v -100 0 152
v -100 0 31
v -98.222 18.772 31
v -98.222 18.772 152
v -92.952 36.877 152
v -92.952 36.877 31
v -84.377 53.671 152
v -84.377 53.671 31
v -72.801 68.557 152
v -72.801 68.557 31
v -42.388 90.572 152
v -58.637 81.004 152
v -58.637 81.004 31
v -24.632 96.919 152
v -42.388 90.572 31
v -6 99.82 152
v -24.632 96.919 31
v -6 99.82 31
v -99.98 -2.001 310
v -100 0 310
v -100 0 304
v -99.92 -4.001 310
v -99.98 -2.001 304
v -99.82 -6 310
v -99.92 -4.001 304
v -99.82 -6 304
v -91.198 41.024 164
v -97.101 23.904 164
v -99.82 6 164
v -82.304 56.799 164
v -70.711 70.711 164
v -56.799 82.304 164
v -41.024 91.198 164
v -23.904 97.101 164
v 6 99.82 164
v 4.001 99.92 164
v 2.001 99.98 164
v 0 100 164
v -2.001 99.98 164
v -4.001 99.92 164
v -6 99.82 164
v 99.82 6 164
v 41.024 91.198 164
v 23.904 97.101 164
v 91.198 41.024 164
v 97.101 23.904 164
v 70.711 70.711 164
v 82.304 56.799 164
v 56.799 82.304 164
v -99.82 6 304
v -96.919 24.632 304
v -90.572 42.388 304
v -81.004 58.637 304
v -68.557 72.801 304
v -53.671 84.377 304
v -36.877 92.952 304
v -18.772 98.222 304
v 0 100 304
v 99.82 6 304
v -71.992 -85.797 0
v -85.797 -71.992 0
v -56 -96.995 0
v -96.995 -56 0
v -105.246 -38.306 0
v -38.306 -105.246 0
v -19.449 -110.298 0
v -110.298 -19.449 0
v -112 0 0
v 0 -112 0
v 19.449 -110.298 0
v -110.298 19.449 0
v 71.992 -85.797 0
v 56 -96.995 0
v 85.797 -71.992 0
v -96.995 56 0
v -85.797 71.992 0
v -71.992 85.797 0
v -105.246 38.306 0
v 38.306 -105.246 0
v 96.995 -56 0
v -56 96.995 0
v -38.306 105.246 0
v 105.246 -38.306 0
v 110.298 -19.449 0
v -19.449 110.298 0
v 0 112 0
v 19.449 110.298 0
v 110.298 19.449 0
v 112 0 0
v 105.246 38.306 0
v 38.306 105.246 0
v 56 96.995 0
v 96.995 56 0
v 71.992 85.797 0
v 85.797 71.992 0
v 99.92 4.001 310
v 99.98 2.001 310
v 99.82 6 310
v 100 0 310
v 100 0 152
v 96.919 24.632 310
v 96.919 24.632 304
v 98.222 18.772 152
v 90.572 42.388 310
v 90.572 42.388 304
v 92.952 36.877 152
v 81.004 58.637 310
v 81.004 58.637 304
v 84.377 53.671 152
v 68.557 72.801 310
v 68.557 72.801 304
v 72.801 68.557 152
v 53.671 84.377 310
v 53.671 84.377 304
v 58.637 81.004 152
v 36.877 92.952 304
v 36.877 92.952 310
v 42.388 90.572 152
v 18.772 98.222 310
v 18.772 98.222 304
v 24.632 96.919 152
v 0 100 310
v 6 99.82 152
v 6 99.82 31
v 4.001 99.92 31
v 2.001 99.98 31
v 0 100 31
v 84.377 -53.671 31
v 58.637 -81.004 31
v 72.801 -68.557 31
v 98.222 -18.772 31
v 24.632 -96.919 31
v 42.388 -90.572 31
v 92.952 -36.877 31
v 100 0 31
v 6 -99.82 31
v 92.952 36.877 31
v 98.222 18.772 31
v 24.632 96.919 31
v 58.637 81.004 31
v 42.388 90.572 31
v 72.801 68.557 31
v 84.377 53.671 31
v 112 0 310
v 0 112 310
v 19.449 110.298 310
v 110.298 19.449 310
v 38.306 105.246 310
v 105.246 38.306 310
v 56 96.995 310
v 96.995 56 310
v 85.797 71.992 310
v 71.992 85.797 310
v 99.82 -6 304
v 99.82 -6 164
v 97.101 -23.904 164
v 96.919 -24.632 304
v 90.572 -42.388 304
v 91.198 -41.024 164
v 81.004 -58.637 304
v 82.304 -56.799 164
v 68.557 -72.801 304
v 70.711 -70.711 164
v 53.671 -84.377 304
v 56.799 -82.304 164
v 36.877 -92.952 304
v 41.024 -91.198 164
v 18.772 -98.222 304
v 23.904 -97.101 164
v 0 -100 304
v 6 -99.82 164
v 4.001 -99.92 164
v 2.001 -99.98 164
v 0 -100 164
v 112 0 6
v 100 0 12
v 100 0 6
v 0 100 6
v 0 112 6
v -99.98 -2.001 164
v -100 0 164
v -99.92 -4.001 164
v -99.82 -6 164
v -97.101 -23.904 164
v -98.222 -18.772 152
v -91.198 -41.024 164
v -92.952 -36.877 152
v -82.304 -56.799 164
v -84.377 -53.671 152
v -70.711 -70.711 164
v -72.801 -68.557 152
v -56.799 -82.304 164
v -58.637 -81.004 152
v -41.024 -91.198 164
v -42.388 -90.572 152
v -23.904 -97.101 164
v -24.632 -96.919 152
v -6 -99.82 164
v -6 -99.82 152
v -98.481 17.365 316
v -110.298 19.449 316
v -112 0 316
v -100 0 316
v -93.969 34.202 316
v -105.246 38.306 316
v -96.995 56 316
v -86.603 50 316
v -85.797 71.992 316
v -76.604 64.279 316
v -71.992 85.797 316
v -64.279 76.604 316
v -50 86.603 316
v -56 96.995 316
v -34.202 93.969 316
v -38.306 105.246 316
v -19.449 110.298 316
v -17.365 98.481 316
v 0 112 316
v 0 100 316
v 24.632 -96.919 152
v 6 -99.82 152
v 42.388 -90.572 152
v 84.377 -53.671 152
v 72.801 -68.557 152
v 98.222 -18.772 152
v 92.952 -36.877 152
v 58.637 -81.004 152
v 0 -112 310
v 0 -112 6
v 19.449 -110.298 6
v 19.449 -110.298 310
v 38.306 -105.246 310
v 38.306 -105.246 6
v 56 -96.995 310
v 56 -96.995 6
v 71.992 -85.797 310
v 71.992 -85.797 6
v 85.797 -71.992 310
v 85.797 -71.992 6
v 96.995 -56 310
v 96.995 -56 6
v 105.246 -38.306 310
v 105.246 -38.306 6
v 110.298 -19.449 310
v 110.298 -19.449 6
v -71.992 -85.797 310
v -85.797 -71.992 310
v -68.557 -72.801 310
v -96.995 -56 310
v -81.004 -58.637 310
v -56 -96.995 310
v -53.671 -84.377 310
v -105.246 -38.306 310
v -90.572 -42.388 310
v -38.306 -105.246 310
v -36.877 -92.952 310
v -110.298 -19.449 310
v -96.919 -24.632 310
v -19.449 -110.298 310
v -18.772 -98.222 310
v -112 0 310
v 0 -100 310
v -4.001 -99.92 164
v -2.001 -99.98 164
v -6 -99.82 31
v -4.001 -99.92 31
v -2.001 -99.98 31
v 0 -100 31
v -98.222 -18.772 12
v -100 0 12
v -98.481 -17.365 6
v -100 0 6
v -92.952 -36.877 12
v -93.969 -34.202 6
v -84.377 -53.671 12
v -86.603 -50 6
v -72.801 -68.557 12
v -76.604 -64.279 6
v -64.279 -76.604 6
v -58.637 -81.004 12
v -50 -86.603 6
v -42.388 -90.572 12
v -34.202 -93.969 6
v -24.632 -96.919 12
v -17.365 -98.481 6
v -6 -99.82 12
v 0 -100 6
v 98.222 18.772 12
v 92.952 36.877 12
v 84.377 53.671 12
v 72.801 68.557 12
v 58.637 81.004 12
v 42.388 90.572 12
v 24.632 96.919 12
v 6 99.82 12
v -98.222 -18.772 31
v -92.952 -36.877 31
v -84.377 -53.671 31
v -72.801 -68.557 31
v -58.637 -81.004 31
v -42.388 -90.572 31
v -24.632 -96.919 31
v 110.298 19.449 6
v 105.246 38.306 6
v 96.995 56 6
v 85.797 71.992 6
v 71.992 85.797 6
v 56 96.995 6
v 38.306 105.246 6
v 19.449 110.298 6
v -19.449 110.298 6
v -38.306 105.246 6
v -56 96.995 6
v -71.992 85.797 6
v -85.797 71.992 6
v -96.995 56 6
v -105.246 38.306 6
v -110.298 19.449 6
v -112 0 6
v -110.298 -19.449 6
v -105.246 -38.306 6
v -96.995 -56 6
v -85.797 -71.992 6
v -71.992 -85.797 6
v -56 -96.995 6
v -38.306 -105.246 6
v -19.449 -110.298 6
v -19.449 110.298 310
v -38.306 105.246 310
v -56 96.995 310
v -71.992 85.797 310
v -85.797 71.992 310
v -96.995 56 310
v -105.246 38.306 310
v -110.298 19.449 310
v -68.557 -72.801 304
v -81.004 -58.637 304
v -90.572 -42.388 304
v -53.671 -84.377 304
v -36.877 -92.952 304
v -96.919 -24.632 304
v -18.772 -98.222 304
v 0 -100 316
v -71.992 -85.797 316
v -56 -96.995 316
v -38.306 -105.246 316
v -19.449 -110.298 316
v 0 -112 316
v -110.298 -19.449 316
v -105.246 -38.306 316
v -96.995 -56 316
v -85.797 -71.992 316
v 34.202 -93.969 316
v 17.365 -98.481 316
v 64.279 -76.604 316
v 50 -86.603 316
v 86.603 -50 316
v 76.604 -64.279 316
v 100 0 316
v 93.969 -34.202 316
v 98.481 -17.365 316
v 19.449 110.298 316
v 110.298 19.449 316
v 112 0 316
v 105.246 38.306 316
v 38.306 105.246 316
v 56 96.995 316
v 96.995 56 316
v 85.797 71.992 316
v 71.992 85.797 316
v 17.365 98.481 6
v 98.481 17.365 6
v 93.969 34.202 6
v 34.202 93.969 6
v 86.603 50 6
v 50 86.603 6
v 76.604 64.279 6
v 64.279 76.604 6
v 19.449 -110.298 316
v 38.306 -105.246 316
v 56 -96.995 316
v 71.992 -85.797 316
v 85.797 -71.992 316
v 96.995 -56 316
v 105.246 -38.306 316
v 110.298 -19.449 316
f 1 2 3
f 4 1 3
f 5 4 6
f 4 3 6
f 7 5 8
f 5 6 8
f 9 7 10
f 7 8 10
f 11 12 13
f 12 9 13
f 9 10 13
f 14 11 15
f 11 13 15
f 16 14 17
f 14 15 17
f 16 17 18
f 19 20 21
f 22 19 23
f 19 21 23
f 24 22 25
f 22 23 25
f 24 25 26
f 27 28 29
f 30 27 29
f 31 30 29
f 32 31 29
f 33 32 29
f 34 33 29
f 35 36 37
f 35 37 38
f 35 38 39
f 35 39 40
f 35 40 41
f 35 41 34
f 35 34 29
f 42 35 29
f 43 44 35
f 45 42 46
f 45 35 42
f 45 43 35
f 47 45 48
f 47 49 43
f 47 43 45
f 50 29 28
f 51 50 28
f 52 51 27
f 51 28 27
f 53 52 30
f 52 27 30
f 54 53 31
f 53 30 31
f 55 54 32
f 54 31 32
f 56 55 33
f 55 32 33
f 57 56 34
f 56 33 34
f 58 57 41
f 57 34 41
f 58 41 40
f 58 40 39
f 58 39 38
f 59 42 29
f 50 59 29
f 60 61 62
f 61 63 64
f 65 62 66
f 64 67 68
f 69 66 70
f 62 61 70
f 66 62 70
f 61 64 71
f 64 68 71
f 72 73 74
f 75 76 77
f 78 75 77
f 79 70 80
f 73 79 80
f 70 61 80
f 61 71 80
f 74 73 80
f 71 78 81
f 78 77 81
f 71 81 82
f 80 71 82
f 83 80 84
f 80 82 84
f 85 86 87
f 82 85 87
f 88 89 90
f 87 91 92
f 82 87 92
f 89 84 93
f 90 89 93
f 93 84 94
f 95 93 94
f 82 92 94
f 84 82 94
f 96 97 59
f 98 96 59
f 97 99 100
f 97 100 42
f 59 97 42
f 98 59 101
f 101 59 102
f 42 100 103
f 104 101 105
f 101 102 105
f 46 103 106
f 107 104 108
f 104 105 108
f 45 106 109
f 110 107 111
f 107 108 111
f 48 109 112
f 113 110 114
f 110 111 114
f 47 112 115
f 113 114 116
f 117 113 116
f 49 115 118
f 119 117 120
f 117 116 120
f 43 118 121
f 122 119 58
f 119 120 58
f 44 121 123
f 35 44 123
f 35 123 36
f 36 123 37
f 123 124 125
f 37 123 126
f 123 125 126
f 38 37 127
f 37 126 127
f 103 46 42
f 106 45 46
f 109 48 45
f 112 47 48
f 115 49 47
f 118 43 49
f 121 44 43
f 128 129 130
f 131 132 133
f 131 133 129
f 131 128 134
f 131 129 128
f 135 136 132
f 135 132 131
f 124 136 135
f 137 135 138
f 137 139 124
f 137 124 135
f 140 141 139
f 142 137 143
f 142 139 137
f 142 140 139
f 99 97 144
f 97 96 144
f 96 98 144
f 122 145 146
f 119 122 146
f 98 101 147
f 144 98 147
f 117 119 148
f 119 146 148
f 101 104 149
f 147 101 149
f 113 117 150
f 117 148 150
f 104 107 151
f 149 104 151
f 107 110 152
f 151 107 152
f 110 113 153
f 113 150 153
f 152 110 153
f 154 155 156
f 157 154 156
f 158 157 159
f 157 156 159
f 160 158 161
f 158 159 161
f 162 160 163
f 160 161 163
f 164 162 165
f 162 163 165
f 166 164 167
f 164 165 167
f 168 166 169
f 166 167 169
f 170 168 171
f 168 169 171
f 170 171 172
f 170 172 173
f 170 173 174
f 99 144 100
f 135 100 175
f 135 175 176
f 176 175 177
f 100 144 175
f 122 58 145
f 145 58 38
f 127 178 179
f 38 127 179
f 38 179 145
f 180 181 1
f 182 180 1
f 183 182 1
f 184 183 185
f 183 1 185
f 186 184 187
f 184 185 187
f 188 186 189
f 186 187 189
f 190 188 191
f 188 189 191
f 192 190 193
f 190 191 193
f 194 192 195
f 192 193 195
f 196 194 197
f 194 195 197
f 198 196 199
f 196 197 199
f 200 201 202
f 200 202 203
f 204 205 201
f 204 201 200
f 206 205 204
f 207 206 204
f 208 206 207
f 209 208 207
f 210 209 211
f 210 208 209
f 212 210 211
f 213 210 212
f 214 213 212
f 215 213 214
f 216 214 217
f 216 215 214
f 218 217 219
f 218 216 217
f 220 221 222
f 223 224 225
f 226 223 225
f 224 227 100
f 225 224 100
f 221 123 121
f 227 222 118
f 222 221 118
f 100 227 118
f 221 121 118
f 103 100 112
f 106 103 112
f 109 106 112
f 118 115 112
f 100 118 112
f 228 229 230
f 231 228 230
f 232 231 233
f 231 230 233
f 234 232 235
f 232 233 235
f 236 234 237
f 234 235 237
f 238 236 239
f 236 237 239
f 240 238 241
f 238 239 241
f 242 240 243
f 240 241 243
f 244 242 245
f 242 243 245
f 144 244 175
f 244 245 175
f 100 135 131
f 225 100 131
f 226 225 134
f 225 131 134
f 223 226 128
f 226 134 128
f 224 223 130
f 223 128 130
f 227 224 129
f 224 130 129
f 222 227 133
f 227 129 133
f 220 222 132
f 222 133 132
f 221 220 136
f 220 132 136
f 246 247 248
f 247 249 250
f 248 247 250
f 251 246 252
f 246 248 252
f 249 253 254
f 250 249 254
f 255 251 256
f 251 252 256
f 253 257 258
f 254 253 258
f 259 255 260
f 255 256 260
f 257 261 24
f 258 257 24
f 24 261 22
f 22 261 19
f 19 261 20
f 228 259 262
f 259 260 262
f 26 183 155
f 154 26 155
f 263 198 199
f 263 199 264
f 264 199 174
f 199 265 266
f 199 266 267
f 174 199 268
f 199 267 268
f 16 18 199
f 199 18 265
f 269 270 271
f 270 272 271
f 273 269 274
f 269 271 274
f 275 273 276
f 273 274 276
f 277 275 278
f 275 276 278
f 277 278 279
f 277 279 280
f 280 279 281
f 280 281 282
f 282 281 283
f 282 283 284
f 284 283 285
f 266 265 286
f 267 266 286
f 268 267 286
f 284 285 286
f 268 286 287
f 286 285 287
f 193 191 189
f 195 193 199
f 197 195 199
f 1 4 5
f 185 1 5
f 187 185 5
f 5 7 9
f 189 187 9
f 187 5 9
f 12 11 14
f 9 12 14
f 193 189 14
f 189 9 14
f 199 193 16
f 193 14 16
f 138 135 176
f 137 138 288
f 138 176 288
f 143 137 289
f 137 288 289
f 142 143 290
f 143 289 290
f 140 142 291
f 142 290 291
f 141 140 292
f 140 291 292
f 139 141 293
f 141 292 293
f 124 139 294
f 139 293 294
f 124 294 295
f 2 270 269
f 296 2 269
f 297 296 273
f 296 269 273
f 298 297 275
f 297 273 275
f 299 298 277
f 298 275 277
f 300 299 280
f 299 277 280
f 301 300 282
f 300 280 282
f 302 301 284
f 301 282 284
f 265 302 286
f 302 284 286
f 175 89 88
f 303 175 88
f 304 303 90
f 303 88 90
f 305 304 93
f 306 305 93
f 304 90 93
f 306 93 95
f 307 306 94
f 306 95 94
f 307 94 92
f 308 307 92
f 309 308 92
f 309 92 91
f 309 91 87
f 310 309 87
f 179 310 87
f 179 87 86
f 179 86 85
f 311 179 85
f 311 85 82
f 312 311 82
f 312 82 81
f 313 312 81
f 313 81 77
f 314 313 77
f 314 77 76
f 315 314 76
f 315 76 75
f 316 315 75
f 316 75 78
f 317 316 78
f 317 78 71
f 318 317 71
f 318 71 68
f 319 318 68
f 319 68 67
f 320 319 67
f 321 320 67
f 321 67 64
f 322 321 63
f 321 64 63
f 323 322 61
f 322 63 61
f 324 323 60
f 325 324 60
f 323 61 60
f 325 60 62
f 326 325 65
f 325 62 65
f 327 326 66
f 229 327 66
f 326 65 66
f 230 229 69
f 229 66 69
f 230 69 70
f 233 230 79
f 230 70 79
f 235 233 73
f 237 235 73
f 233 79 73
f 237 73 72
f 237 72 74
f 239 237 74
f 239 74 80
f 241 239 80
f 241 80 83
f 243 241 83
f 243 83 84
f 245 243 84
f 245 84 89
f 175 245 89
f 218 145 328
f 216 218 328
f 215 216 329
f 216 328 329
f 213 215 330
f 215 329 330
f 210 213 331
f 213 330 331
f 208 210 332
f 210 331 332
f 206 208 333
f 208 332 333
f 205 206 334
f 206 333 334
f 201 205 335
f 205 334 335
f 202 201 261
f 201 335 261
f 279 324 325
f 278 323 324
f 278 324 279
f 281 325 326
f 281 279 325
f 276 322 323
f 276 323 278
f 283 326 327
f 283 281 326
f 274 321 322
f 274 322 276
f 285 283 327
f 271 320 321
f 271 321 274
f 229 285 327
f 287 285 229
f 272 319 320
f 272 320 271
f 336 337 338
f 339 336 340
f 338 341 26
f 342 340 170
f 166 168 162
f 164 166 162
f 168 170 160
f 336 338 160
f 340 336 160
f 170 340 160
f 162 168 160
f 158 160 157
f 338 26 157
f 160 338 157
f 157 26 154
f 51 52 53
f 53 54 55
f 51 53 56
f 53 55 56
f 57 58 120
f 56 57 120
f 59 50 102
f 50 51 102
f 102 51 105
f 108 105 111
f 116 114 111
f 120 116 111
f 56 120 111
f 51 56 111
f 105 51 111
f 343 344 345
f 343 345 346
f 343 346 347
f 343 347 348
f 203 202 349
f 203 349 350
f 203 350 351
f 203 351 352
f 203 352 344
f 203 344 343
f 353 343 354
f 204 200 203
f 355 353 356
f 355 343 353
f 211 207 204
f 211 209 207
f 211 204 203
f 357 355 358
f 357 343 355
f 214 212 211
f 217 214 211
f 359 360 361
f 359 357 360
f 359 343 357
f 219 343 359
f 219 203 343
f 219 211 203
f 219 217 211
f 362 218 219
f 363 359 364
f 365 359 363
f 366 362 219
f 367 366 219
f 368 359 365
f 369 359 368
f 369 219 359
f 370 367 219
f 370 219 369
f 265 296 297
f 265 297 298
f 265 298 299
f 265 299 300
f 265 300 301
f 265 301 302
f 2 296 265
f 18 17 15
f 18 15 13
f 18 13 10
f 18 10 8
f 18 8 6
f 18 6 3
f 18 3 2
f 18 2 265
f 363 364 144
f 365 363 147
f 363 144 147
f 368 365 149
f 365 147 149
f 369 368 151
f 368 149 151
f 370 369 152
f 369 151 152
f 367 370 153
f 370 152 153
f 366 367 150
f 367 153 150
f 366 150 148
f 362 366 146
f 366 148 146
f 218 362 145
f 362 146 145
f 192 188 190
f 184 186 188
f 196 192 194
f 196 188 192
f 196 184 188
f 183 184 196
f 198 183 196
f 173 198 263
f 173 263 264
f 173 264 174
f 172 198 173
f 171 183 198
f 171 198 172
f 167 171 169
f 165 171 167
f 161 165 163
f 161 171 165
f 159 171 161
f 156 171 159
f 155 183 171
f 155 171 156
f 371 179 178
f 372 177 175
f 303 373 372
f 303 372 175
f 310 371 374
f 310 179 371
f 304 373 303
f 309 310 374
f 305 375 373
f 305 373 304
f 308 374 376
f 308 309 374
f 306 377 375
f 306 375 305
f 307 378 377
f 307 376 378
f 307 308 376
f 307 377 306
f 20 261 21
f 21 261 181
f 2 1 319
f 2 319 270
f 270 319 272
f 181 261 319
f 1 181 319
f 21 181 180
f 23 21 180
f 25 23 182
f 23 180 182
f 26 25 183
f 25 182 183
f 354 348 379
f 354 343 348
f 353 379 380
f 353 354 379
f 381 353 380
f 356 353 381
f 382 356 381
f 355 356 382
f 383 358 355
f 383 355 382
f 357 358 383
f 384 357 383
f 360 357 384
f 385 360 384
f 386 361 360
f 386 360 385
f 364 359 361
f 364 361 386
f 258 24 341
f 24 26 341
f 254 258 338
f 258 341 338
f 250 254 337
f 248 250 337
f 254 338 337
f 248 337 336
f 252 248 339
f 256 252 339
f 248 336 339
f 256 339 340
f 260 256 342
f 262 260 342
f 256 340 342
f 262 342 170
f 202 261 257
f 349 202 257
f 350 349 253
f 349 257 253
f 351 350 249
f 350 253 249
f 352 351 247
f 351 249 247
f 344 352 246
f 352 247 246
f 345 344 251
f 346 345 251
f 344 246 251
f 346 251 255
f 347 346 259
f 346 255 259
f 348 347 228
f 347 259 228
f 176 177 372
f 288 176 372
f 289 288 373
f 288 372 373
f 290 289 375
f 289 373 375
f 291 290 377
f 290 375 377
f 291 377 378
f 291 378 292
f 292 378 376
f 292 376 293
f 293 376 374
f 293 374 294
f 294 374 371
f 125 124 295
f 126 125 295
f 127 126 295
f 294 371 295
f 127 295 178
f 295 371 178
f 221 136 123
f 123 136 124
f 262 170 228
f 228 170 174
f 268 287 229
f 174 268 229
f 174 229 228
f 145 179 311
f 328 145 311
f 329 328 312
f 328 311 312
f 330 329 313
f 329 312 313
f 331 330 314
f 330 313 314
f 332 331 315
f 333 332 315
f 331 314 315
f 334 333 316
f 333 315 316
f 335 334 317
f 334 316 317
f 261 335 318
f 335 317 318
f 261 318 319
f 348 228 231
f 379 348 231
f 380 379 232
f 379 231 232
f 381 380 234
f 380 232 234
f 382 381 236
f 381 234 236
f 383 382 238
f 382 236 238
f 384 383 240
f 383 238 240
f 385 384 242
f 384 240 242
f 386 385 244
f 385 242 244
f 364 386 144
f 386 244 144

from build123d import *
from build123d import SkipClean  # not in build123d's __all__

# Parameters (mm, degrees)
F0_R      = 112
F1_DEPTH  = 6
F3_DEPTH  = 6
F5_DEPTH  = 140
F7_DEPTH  = 12
F9_DEPTH  = 140
F11_DEPTH = 6
F12_R     = 112
F12_R_2   = 100
F13_DEPTH = 6
F14_DEPTH = 25
F16_DEPTH = 310


with BuildPart() as f1:
    # F0 (on Top) → F1 (new body)
    with BuildSketch(Plane.XY):
        Circle(F0_R)
    extrude(amount=F1_DEPTH)

    # F2 (on face) → F3 (join)
    with BuildSketch(Plane.XY.offset(6)):
        with BuildLine():
            ThreePointArc((-100, 0), (0, -100), (100, 0))
            ThreePointArc((100, 0), (70.7106781187, 70.7106781187), (0, 100))
            ThreePointArc((0, 100), (-70.7106781187, 70.7106781187), (-100, 0))
        make_face()
    extrude(amount=F3_DEPTH)

    # F4 (on face) → F5 (join)
    with BuildSketch(Plane.XY.offset(12)):
        with BuildLine():
            ThreePointArc((6, 99.8198377077), (3.0013521308, 99.9549492791), (0, 100))
            ThreePointArc((0, 100), (-3.0013521308, 99.9549492791), (-6, 99.8198377077))
            Line((-6, 99.8198377077), (-6, -99.8198377077))
            ThreePointArc((-6, -99.8198377077), (-3.0013521308, -99.9549492791), (0, -100))
            ThreePointArc((0, -100), (3.0013521308, -99.9549492791), (6, -99.8198377077))
            Line((6, -99.8198377077), (6, 99.8198377077))
        make_face()
    extrude(amount=F5_DEPTH)

    # F6 (on face) → F7 (join)
    with BuildSketch(Plane.XY.offset(152)):
        with BuildLine():
            Line((-6, -99.8198377077), (-6, 99.8198377077))
            ThreePointArc((-6, 99.8198377077), (-100, 0), (-6, -99.8198377077))
        make_face()
        with BuildLine():
            Line((6, -99.8198377077), (6, 99.8198377077))
            ThreePointArc((6, 99.8198377077), (0, 100), (-6, 99.8198377077))
            Line((-6, 99.8198377077), (-6, -99.8198377077))
            ThreePointArc((-6, -99.8198377077), (0, -100), (6, -99.8198377077))
        make_face()
        with BuildLine():
            ThreePointArc((6, -99.8198377077), (72.8010988928, -68.556546004), (100, 0))
            ThreePointArc((100, 0), (72.8010988928, 68.556546004), (6, 99.8198377077))
            Line((6, 99.8198377077), (6, -99.8198377077))
        make_face()
    extrude(amount=F7_DEPTH)

    # F8 (on face) → F9 (join)
    with BuildSketch(Plane.XY.offset(164)):
        with BuildLine():
            Line((99.8198377077, 6), (-99.8198377077, 6))
            ThreePointArc((-99.8198377077, 6), (-99.9549492791, 3.0013521308), (-100, 0))
            ThreePointArc((-100, 0), (-99.9549492791, -3.0013521308), (-99.8198377077, -6))
            Line((-99.8198377077, -6), (99.8198377077, -6))
            ThreePointArc((99.8198377077, -6), (99.9549492791, -3.0013521308), (100, 0))
            ThreePointArc((100, 0), (99.9549492791, 3.0013521308), (99.8198377077, 6))
        make_face()
    extrude(amount=F9_DEPTH)

    # F10 (on face) → F11 (join)
    with BuildSketch(Plane.XY.offset(304)):
        with BuildLine():
            Line((-99.8198377077, 6), (99.8198377077, 6))
            ThreePointArc((99.8198377077, 6), (0, 100), (-99.8198377077, 6))
        make_face()
        with BuildLine():
            ThreePointArc((99.8198377077, -6), (99.9549492791, -3.0013521308), (100, 0))
            ThreePointArc((100, 0), (99.9549492791, 3.0013521308), (99.8198377077, 6))
            Line((99.8198377077, 6), (-99.8198377077, 6))
            ThreePointArc((-99.8198377077, 6), (-100, 0), (-99.8198377077, -6))
            Line((-99.8198377077, -6), (99.8198377077, -6))
        make_face()
        with BuildLine():
            ThreePointArc((-99.8198377077, -6), (0, -100), (99.8198377077, -6))
            Line((99.8198377077, -6), (-99.8198377077, -6))
        make_face()
    extrude(amount=F11_DEPTH)

    # F12 (on face) → F13 (join)
    with BuildSketch(Plane.XY.offset(310)):
        Circle(F12_R)
        Circle(F12_R_2, mode=Mode.SUBTRACT)
        Circle(F12_R_2)
    extrude(amount=F13_DEPTH)

    # F2 (on face) → F14 (join)
    with BuildSketch(Plane.XY.offset(6)):
        with BuildLine():
            ThreePointArc((-100, 0), (0, -100), (100, 0))
            ThreePointArc((100, 0), (70.7106781187, 70.7106781187), (0, 100))
            ThreePointArc((0, 100), (-70.7106781187, 70.7106781187), (-100, 0))
        make_face()
    with SkipClean():  # cleaning this boolean's faces spoils the solid; the shape is the same uncleaned
        extrude(amount=F14_DEPTH)

    # F15 (on face) → F16 (join)
    with BuildSketch(Plane.XY.offset(6)):
        with BuildLine():
            Line((0, 100), (0, 112))
            ThreePointArc((0, 112), (-79.1959594929, 79.1959594929), (-112, 0))
            Line((-112, 0), (-100, 0))
            ThreePointArc((-100, 0), (-70.7106781187, 70.7106781187), (0, 100))
        make_face()
        with BuildLine():
            ThreePointArc((0, -112), (79.1959594929, -79.1959594929), (112, 0))
            Line((112, 0), (100, 0))
            ThreePointArc((100, 0), (70.7106781187, -70.7106781187), (0, -100))
            Line((0, -100), (0, -112))
        make_face()
    extrude(amount=F16_DEPTH)


solid = f1.part
